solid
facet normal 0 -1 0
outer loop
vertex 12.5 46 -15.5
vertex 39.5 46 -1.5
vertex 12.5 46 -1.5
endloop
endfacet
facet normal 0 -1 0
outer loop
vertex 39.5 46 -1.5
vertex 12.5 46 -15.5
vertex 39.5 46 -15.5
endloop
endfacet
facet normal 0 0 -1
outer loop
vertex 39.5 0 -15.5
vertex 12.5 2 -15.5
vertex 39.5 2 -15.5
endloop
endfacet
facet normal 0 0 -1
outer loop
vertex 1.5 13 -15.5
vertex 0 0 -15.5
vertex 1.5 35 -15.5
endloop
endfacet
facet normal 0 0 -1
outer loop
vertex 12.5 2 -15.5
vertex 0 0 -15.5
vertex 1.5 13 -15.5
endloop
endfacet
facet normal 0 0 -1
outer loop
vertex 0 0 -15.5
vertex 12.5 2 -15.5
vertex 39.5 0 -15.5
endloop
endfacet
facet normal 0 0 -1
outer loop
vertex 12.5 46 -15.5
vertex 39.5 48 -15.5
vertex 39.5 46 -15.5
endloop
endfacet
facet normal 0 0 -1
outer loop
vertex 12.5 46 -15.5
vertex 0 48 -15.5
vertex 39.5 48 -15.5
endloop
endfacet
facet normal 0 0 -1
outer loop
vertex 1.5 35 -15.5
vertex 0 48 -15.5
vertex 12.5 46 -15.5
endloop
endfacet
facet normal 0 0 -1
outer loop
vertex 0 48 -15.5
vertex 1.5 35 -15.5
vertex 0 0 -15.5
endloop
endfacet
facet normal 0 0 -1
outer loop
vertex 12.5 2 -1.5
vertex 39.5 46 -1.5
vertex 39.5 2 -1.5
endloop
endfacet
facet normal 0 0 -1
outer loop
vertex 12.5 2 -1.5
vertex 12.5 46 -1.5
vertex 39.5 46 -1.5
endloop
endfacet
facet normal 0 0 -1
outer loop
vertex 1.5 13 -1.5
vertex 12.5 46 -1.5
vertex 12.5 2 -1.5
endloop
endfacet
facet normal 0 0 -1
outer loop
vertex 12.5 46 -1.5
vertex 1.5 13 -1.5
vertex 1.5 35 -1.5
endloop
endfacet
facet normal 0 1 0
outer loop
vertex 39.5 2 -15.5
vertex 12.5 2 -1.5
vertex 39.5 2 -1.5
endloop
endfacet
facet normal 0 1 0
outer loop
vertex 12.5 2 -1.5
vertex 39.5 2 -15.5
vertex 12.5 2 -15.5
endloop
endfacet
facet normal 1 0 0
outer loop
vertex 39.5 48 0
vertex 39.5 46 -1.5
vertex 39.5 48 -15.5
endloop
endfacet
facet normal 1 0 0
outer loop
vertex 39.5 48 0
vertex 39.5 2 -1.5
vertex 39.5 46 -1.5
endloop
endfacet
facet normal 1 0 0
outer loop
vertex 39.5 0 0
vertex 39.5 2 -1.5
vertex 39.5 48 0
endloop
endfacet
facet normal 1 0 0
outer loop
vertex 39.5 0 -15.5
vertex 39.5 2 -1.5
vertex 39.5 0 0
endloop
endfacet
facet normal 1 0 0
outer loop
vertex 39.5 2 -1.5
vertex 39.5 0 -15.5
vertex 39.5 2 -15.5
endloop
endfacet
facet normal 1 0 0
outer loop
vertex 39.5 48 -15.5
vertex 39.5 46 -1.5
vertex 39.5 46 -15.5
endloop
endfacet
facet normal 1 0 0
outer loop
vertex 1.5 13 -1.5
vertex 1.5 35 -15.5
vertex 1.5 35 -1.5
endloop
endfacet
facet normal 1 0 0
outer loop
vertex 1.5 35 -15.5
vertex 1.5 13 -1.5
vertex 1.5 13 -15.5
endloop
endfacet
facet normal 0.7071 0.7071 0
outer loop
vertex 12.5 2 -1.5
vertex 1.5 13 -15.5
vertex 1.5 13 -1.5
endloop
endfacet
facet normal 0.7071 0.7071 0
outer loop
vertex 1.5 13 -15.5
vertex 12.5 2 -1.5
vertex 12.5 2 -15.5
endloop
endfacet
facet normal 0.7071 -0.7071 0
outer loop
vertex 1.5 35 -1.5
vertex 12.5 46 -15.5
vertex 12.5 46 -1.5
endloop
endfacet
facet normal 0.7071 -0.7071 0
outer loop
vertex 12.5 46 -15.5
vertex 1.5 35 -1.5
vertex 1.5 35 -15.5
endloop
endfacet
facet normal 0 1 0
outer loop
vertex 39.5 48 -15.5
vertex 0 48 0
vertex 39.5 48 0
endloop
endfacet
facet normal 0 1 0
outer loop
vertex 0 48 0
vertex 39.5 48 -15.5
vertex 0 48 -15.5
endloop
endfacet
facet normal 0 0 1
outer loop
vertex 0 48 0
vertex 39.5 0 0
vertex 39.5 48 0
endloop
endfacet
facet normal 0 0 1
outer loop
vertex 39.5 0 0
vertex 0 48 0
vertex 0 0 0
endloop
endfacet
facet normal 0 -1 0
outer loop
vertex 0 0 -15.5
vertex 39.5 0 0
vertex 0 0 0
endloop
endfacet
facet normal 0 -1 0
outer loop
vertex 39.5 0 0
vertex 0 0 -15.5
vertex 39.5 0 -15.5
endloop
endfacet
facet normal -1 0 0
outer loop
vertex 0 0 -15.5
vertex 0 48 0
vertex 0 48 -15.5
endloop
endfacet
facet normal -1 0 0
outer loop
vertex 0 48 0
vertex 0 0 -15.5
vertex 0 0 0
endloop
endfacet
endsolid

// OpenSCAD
// file: atis_lib.scad
// Gyűrű fix falvastagsággal. Ez az eredeti. Nem változtatom meg, mert több helyen már használom
module gyuru(r1, r2,h, w, center=false){
    difference(){
        cylinder(r1=r1,r2=r2,h, center=center, $fn=12*r1);
        translate([0,0,-0.1])cylinder(r1=r1-w, r2=r2-w,h+0.2, center=center, $fn=12*(r1-w)); // trükközés: már preview-ban is normálisan jelenjen meg a gyűrű
    }
}

// Gyűrű fix belső átmérővel

module gyuru_fixrb(r1, r2, h, r_belso, center=false){
    difference(){
        cylinder(r1=r1, r2=r2, h, center=center, $fn=12*r1);
        translate([0,0,-0.1])cylinder(r=r_belso, h+0.2, center=center, $fn=12*r_belso);
    }
    
}

//inset_width= min(nozzle dia/2, 0.4)
module inset_first_layer(inset_height=0.31,inset_width=0.2, render=false)
{   
    if (render == true){
        difference()
        { 
            children();

            translate([0,0,-1])
            linear_extrude(height=inset_height+1)
            difference()
            {
                offset(r = inset_width) 
                projection(cut=true) 
                translate([0,0,-inset_height])
                children();

                offset(r = -inset_width) 
                projection(cut=true) 
                translate([0,0,-inset_height])
                children();
            }
        } 
    }
    else{
        echo("Inset not rendered!");
    }
} 

module deszka(m, sz, v, vastagsag, cimke){
    cube([m,sz,v], center=true);
    if (m == vastagsag){
        t = sz * v;
        echo(cimke, m , sz, v, t/1000/1000);
    } else if (sz == vastagsag){
            t = m*v;
            echo(cimke, m , sz, v, t/1000/1000);
    } else if (v == vastagsag){
            t = m*sz;
            echo(cimke, m , sz, v, t/1000/1000);
    }
    echo(cimke, m , sz, v, t);
}



// csm=[melyseg, szelesseg, magassag, also resz magassag, ,henger sugara

//csatlakozo([5,10,20,2,2,1.5]);

module csatlakozo(csm){
    cw = csm[0];
    sz = csm[1];
    h = csm[2];
    ch = csm[3];
    ny = csm[4];
    R=csm[5];
    translate([-cw/2, -sz/2, -h/2]){
        cube([cw,sz,ch]);
        translate([0,sz,ch])
            rotate([90,0,0])
                linear_extrude(height=sz)polygon([[0,0], [cw, 0], [0,cw+1], [0,0]]);
        translate([0,(sz-ny)/2,0])
        intersection()
        {
            translate([0,R+ny/2,0])
                rotate([90,0,0])
                    linear_extrude(height=2*R)polygon([[0,0], [cw, 0], [cw, h-cw-1], [0,h], [0,0]]);
            union(){
                cube([cw-R,ny, h]);
                translate([cw-R-0.5,ny/2,0]) cylinder(r=R, h=h,$fn=80);
            }
        }
    }
}

module gombolyitett_csatlakozo(csm){
    cw = csm[0]-1;
    sz = csm[1]-2;
    h = csm[2]-2;
    ch = csm[3];
    ny = csm[4];
    R=csm[5];
    translate([-cw/2, -sz/2, -h/2]){
        cube([cw,sz,ch]);
        translate([0,sz,ch])
            rotate([90,0,0])
                linear_extrude(height=sz)polygon([[0,0], [cw, 0], [0,cw+1], [0,0]]);
        translate([0,(sz-ny)/2,0])
        intersection()
        {
            translate([0,R+ny/2,0])
                rotate([90,0,0])
                    linear_extrude(height=2*R)polygon([[0,0], [cw, 0], [cw, h-cw-1], [0,h], [0,0]]);
            union(){
                cube([ny, ny,h]);
                translate([cw-R-0.5,ny/2,0]) cylinder(r=R, h=h,$fn=80);
            }
        }
    }
}

module kivagas(l, d, w){
    hull(){
        cylinder(r=d/2,h = w-2, $fn=12*d/2);
        translate([l-d,0,0])cylinder(r=d/2, h=w-2, $fn=12*d/2);
    }
    translate([0,0,w-2])hull(){
        cylinder(r1=d/2, r2=d/2+2,h = 2, $fn=12*d/2);
        translate([l-d,0,0])cylinder(r1=d/2, r2=d/2+2, h=2, $fn=12*d/2);
    }
}

function shelly1L_befoglalo() = [44, 38, 14];

module shelly1L(){
    b = shelly1L_befoglalo();
    s_h = b[2];
    s_w = b[0];
    s_d = b[1];
    module lecsapott_sarok(){
        echo(s_h);
        linear_extrude(height=s_h)polygon([[0,0],[0,11],[11,0],[0,0]]);
    }
    difference(){
        cube([s_w,s_d,s_h]);
        lecsapott_sarok();
        translate([s_w,0,0])rotate(90)lecsapott_sarok();
    }
    
}
// main file
use <atis_lib.scad>;

lyuk_atmero = 115;

r_n = lyuk_atmero/2 + 2;
r_k = lyuk_atmero/2 - 2;


module dugo(){
    gyuru_fixrb(r_n,r_k, 40,50);
    translate([0,0,-2])cylinder(r=r_n, h=2, $fn = 12*r_n);
}

rotate([180,0,90])foglalat();

module foglalat(){
    difference(){
        cube(shelly1L_befoglalo()+[4,1.5,1.5]);
        translate([2, 1.5, 1.5 ])shelly1L();
    }
}
